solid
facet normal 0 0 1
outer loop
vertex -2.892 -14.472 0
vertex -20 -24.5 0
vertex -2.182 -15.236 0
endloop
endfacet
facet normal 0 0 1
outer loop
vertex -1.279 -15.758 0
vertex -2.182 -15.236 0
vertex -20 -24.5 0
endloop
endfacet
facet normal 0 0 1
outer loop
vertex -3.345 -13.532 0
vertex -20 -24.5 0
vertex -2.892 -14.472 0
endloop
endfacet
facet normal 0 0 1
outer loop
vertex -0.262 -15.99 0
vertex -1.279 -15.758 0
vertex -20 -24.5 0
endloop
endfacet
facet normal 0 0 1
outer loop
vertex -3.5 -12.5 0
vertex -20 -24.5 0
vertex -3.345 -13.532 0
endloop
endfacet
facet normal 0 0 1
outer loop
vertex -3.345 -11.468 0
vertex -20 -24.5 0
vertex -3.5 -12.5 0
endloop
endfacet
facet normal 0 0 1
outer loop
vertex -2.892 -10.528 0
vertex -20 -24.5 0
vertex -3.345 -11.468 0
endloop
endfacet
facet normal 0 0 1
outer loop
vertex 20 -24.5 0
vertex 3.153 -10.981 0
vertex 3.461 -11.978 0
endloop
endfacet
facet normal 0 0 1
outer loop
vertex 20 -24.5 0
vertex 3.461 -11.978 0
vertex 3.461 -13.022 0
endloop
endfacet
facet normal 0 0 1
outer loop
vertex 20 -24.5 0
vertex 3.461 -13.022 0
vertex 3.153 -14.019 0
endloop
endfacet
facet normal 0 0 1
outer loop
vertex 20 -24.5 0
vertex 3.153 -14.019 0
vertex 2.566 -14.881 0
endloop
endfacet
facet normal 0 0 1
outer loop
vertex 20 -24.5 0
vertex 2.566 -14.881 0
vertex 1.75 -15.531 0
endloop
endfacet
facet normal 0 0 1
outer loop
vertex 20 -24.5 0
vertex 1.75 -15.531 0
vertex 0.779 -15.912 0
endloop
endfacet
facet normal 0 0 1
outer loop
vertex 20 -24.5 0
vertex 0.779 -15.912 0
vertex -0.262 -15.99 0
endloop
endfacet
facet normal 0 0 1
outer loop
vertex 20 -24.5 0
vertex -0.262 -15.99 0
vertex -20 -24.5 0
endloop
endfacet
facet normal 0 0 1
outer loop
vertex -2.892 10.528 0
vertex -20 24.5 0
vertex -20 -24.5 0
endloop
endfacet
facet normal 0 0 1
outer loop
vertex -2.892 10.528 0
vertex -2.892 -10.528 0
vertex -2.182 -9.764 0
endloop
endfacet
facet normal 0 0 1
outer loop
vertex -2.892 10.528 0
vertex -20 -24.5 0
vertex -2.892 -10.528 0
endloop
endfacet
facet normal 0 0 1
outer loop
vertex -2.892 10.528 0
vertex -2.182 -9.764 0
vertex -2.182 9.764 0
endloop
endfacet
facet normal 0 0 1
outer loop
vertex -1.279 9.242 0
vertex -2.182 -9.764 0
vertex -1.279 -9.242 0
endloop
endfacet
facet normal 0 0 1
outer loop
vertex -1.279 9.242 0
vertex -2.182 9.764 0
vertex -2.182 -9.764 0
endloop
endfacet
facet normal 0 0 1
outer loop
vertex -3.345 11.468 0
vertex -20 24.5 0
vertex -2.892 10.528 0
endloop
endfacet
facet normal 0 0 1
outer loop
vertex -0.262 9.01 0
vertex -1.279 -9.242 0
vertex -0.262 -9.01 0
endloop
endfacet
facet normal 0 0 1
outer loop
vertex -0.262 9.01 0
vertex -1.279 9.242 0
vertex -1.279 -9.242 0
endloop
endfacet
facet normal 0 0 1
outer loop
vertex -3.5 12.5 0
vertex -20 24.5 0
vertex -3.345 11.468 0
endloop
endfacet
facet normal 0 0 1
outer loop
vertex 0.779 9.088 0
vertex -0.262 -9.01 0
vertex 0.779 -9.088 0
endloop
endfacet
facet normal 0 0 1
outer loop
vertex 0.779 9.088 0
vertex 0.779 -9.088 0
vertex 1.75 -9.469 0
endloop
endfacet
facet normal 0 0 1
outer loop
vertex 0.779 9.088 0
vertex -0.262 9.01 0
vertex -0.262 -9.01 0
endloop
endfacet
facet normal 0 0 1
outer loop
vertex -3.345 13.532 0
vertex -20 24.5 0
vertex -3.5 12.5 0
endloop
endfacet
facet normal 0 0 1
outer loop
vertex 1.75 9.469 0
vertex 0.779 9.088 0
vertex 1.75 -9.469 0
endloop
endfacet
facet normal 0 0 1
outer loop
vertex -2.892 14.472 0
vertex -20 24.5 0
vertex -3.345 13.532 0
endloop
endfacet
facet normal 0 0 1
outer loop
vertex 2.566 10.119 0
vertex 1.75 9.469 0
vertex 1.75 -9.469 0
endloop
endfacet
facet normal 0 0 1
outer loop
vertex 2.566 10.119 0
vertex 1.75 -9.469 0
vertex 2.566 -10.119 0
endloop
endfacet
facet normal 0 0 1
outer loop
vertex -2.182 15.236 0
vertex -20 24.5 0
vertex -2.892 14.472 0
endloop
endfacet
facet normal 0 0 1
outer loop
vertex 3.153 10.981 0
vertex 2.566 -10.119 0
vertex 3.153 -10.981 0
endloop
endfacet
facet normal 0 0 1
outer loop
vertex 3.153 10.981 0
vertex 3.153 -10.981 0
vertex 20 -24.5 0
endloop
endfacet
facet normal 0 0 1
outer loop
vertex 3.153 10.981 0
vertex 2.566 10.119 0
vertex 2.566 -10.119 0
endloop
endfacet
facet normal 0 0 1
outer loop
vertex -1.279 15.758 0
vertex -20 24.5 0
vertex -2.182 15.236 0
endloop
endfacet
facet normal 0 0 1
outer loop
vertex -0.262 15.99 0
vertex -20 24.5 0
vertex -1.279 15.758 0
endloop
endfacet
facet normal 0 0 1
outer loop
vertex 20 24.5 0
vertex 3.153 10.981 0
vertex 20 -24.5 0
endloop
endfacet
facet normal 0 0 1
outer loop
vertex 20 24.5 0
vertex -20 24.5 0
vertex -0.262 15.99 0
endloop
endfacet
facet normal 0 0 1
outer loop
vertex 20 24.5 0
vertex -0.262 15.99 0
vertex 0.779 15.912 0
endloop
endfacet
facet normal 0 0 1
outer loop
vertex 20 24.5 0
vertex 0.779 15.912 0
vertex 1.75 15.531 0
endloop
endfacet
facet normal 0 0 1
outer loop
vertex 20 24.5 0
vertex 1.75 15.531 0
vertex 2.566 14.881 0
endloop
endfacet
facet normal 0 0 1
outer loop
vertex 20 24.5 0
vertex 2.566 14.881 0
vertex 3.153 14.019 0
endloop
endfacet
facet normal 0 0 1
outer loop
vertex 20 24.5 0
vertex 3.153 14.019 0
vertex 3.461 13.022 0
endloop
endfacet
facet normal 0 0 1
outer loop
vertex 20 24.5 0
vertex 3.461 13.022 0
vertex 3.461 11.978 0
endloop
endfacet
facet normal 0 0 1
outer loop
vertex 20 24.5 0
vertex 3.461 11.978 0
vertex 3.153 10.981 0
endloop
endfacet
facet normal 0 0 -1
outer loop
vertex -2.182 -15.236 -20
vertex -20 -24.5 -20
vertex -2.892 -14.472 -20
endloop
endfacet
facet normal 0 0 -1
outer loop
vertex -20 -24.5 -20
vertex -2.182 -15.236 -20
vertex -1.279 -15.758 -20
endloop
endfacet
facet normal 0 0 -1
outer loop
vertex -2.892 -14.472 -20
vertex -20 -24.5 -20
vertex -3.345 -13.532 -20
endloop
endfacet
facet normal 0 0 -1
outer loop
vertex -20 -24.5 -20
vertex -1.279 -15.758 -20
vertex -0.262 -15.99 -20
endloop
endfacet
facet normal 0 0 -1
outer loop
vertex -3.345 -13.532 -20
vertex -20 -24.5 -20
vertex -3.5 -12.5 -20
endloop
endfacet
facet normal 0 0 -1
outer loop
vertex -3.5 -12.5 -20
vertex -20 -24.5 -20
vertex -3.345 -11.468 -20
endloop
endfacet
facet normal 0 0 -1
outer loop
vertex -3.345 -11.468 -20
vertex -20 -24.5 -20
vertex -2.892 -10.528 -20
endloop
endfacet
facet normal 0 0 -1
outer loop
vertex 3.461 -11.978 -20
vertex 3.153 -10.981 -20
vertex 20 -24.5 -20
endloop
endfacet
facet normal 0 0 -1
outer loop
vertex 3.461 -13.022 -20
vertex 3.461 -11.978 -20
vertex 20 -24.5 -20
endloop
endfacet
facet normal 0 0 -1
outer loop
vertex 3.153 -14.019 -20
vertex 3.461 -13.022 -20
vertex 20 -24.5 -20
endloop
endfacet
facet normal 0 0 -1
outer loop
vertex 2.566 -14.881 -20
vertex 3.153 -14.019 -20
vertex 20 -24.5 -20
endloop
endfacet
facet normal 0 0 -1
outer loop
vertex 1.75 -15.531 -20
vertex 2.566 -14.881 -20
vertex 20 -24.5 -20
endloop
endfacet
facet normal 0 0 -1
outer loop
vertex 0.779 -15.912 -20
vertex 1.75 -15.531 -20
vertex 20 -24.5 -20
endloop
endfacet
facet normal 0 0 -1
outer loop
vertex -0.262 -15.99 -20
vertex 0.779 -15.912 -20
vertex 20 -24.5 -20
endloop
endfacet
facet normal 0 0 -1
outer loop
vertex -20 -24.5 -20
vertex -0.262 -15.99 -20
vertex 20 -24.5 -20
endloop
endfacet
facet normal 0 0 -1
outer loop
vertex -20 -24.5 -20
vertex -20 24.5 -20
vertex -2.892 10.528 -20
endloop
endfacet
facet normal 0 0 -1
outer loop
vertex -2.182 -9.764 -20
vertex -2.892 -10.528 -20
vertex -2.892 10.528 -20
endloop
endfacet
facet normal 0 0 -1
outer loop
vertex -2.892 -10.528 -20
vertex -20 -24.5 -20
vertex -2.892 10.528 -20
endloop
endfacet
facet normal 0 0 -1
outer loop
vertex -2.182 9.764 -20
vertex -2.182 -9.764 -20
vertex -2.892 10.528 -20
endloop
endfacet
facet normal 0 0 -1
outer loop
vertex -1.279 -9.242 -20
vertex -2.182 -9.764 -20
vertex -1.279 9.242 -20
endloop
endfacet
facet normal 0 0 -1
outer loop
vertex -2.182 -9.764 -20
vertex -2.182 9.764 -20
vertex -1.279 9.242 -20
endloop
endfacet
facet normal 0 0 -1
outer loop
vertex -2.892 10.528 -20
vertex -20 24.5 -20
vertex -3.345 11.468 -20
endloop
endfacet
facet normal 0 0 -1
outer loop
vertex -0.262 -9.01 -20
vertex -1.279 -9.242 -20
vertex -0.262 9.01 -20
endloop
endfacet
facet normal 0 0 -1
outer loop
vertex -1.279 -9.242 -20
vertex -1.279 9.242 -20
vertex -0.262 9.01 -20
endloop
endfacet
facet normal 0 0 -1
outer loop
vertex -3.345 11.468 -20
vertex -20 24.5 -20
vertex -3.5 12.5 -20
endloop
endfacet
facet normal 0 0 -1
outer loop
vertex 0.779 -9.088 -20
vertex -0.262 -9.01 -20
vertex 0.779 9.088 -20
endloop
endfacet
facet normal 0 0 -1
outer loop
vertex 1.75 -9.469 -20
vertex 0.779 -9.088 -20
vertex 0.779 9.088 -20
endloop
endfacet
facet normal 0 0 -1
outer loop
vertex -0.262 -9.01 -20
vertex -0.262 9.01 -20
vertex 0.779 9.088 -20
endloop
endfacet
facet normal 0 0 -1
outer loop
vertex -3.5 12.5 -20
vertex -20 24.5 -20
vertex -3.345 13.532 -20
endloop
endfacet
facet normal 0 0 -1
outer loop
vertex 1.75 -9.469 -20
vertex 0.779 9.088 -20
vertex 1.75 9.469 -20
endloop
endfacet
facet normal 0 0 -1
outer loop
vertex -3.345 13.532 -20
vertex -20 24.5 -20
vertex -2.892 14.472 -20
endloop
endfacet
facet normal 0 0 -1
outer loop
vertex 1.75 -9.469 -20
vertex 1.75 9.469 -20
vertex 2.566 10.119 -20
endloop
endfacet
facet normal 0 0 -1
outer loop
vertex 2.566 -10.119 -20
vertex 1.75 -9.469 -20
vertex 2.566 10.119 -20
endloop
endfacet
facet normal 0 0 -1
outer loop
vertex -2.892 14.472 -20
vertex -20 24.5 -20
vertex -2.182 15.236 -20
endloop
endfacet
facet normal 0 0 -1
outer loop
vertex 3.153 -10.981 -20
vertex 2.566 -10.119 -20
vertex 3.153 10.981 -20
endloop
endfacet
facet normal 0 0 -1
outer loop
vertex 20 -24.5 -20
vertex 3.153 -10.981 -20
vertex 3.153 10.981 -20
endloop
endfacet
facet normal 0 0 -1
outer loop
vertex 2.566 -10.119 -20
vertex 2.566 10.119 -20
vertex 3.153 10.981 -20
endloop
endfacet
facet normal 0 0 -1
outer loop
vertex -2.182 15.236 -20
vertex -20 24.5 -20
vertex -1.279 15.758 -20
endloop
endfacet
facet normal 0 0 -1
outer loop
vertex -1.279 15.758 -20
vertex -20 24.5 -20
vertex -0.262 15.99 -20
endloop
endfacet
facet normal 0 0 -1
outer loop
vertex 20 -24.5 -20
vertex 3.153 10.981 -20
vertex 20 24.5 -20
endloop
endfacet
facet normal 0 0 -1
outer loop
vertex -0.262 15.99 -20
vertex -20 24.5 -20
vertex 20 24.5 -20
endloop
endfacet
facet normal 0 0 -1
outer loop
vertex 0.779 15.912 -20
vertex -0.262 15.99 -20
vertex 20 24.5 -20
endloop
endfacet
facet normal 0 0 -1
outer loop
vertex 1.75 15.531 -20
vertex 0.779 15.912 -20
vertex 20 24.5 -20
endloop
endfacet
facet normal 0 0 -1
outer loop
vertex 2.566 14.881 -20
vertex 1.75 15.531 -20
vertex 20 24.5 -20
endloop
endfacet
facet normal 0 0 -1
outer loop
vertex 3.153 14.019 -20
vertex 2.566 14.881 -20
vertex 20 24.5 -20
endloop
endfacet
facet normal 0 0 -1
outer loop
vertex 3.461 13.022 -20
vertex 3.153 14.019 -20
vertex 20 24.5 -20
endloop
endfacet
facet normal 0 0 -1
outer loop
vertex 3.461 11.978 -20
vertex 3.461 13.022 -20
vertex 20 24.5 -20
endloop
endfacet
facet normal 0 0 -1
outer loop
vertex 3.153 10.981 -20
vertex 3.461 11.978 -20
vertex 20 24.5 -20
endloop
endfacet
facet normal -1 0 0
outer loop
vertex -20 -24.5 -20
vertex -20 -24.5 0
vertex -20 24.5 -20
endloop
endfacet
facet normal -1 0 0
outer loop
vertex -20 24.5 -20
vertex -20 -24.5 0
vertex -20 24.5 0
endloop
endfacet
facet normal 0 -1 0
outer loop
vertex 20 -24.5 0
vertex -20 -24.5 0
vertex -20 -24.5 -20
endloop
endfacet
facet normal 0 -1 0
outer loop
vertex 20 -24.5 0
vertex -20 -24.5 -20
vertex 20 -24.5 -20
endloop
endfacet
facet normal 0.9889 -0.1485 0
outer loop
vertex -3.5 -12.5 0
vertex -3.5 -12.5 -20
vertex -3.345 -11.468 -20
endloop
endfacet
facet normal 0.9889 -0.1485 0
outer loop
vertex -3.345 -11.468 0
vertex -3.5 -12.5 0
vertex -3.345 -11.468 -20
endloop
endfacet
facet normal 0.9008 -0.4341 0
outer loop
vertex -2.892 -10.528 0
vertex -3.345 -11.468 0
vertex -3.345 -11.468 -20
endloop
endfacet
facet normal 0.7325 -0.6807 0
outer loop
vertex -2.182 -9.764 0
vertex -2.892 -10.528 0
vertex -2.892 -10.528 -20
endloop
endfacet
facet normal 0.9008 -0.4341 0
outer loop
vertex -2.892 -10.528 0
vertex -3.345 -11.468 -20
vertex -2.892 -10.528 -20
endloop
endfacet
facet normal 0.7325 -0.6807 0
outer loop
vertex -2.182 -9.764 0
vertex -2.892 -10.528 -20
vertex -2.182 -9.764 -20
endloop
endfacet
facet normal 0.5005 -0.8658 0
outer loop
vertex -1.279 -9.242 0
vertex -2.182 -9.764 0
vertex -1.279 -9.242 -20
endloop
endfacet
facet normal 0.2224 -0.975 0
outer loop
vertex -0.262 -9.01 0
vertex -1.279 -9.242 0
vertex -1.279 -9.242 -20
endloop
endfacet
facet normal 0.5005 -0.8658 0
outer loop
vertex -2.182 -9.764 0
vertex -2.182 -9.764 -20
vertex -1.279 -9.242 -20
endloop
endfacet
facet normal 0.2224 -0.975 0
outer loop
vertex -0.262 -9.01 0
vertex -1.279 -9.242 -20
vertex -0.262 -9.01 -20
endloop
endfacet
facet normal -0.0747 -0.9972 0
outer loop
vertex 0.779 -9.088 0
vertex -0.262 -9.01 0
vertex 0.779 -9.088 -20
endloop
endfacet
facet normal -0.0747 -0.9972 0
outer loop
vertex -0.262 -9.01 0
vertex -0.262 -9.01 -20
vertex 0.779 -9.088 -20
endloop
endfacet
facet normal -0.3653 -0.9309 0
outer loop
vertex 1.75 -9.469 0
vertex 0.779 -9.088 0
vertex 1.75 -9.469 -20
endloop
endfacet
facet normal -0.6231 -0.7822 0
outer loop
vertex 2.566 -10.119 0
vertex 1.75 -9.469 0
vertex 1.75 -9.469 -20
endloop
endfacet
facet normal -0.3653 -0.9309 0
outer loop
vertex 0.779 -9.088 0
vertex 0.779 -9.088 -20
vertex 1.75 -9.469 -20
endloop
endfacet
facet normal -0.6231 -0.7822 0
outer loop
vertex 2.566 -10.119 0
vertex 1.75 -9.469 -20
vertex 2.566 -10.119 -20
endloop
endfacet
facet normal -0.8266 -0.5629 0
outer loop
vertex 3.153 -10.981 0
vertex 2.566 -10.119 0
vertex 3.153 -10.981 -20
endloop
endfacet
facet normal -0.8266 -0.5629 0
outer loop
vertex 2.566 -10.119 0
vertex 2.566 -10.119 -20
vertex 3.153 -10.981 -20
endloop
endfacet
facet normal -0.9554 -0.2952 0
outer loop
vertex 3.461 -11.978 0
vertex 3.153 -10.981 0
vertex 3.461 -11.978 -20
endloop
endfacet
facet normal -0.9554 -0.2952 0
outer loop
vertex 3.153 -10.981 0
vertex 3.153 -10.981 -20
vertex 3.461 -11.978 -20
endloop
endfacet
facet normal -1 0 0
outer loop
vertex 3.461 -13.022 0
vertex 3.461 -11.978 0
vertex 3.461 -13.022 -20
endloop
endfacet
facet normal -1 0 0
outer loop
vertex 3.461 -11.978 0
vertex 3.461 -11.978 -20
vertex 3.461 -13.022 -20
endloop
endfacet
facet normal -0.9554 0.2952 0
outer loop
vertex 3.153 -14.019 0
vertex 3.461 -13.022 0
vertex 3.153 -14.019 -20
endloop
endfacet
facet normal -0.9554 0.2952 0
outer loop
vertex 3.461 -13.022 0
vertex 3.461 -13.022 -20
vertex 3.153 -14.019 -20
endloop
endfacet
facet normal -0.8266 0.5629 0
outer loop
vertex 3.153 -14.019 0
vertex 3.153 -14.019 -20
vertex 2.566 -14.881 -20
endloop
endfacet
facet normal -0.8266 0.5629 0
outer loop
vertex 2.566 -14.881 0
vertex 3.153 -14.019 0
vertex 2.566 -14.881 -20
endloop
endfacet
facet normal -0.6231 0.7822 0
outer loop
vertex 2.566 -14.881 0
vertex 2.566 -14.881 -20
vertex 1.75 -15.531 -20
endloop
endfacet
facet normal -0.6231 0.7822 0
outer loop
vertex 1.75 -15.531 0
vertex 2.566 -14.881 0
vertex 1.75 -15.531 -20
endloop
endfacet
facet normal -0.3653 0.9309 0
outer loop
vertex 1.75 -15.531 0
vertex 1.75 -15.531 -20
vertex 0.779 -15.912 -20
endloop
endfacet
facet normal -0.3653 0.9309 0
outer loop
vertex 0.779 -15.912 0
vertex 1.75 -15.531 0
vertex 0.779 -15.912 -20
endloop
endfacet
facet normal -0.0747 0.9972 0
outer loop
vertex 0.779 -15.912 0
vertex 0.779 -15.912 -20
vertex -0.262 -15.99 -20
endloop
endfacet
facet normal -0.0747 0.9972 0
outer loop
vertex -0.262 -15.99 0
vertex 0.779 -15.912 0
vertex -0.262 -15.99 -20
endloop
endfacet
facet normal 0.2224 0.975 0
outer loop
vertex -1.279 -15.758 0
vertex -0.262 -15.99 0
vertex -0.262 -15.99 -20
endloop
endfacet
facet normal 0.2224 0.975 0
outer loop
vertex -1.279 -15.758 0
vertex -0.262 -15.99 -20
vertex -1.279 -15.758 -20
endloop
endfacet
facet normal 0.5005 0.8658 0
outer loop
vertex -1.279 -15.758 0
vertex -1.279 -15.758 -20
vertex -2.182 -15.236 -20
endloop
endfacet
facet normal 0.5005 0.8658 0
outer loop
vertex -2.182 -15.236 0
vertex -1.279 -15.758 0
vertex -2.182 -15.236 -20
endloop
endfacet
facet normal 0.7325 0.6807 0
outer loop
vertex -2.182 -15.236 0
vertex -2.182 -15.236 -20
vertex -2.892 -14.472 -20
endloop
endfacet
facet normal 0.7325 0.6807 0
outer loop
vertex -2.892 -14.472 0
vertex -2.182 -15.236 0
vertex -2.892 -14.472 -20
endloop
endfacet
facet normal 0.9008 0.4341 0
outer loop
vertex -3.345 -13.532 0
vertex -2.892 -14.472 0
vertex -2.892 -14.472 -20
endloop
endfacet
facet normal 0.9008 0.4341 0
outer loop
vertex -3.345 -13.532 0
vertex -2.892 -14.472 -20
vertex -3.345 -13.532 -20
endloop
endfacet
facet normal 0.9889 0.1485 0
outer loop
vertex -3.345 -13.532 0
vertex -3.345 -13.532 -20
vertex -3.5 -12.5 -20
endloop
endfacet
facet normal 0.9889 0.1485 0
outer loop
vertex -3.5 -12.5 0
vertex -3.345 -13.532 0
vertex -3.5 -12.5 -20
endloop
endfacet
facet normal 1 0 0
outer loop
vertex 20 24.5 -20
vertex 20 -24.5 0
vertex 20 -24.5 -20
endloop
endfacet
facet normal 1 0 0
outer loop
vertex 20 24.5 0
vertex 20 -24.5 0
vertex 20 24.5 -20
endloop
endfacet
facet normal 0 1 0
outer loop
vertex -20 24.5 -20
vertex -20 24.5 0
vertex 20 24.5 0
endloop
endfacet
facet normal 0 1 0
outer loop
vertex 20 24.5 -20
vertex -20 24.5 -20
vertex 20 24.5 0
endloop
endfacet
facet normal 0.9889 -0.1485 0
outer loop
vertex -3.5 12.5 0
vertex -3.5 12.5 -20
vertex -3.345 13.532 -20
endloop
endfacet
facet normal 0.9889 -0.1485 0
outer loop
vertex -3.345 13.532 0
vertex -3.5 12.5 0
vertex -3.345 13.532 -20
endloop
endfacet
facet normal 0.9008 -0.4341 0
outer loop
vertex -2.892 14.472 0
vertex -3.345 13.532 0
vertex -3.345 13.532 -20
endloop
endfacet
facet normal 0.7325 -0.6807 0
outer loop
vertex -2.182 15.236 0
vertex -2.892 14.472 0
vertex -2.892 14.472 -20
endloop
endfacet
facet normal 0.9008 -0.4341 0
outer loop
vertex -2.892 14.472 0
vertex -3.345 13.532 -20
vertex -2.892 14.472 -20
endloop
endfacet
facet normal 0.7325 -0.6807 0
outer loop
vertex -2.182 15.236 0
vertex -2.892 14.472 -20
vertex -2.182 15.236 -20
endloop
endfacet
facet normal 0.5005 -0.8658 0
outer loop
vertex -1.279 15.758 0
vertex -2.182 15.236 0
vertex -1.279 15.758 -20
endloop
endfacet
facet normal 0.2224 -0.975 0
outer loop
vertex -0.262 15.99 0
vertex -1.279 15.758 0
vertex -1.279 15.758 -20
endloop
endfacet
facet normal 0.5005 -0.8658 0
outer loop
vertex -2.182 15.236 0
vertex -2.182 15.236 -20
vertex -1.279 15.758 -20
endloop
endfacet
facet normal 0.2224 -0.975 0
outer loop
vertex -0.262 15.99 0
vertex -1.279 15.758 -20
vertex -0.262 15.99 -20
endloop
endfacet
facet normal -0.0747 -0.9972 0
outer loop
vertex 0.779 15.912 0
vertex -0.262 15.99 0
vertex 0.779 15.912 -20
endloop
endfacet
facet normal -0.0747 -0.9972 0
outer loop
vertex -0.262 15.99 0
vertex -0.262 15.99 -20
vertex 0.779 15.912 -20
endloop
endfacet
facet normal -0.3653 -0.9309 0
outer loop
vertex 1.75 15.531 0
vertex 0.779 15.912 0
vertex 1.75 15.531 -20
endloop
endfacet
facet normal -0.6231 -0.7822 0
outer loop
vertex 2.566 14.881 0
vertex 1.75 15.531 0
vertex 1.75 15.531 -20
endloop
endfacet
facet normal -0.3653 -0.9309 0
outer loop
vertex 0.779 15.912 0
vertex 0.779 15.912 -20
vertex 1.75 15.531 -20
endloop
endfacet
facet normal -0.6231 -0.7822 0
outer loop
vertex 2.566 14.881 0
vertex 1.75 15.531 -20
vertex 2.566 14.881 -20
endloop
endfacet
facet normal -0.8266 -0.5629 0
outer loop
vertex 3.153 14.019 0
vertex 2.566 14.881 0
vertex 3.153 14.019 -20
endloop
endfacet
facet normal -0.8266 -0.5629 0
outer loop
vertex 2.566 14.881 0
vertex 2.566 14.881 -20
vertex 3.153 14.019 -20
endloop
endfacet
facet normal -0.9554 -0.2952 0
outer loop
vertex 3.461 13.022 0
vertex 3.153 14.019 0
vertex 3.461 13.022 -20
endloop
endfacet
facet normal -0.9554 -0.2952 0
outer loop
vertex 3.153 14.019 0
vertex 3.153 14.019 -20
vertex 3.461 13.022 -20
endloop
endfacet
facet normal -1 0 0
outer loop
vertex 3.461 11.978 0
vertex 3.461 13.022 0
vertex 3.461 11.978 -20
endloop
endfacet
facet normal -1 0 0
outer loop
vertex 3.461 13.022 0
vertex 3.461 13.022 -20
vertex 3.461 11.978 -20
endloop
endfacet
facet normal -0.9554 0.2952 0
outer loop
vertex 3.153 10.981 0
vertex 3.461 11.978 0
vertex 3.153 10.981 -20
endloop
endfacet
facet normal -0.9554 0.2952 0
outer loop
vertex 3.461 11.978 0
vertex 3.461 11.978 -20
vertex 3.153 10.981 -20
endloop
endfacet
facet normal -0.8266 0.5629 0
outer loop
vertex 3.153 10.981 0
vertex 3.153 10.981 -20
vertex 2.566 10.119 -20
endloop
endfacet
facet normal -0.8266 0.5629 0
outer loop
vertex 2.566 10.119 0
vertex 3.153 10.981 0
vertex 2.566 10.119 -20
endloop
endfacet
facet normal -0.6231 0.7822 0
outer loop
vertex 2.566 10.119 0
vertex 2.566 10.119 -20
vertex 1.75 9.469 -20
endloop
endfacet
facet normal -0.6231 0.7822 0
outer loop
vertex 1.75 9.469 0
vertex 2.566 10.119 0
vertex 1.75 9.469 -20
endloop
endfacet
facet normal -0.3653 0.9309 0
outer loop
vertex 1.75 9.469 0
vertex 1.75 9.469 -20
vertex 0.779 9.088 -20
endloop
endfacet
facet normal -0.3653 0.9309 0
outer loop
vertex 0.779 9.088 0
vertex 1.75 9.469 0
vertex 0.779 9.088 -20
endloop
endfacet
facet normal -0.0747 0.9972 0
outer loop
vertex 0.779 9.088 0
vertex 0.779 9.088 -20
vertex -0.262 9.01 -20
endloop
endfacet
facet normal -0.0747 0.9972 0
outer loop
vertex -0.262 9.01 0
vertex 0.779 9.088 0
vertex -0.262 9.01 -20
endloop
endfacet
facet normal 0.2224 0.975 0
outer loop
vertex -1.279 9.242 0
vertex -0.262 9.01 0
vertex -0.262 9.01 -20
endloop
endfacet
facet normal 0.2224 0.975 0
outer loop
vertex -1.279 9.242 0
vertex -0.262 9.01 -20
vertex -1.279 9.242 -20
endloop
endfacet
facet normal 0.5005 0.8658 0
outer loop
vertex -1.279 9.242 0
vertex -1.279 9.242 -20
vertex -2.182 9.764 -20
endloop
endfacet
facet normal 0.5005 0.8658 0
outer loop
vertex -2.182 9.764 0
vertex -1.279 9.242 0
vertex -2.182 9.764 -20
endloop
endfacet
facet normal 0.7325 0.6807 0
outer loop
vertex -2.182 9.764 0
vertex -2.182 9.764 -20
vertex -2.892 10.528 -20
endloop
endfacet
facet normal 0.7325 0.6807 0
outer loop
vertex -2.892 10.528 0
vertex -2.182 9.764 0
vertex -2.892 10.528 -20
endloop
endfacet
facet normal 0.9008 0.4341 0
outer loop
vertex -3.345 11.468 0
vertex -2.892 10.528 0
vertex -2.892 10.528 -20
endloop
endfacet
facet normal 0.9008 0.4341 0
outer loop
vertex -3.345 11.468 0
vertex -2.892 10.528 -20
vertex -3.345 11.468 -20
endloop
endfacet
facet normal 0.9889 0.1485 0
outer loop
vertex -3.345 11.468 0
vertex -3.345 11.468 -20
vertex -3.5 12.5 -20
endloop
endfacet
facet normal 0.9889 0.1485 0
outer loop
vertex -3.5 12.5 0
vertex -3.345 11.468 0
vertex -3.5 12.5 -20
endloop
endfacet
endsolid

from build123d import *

# Parameters (mm, degrees)
F0_W     = 40
F0_H     = 49
F1_DEPTH = 20
F3_D     = 7
F3_DEPTH = 23
F3_TIP   = 2.1030121666


with BuildPart() as f1:
    # F0 (on Top) → F1 (new body)
    with BuildSketch(Plane.XY):
        Rectangle(F0_W, F0_H)
    extrude(amount=-F1_DEPTH)

    # F3
    with Locations(Plane.XY):
        with Locations((0, -12.5), (0, 12.5)):
            Hole(F3_D / 2, depth=F3_DEPTH)
            with Locations((0, 0, -(F3_DEPTH + F3_TIP / 2))):  # 118° drill point
                Cone(0, F3_D / 2, F3_TIP, mode=Mode.SUBTRACT)


solid = f1.part
